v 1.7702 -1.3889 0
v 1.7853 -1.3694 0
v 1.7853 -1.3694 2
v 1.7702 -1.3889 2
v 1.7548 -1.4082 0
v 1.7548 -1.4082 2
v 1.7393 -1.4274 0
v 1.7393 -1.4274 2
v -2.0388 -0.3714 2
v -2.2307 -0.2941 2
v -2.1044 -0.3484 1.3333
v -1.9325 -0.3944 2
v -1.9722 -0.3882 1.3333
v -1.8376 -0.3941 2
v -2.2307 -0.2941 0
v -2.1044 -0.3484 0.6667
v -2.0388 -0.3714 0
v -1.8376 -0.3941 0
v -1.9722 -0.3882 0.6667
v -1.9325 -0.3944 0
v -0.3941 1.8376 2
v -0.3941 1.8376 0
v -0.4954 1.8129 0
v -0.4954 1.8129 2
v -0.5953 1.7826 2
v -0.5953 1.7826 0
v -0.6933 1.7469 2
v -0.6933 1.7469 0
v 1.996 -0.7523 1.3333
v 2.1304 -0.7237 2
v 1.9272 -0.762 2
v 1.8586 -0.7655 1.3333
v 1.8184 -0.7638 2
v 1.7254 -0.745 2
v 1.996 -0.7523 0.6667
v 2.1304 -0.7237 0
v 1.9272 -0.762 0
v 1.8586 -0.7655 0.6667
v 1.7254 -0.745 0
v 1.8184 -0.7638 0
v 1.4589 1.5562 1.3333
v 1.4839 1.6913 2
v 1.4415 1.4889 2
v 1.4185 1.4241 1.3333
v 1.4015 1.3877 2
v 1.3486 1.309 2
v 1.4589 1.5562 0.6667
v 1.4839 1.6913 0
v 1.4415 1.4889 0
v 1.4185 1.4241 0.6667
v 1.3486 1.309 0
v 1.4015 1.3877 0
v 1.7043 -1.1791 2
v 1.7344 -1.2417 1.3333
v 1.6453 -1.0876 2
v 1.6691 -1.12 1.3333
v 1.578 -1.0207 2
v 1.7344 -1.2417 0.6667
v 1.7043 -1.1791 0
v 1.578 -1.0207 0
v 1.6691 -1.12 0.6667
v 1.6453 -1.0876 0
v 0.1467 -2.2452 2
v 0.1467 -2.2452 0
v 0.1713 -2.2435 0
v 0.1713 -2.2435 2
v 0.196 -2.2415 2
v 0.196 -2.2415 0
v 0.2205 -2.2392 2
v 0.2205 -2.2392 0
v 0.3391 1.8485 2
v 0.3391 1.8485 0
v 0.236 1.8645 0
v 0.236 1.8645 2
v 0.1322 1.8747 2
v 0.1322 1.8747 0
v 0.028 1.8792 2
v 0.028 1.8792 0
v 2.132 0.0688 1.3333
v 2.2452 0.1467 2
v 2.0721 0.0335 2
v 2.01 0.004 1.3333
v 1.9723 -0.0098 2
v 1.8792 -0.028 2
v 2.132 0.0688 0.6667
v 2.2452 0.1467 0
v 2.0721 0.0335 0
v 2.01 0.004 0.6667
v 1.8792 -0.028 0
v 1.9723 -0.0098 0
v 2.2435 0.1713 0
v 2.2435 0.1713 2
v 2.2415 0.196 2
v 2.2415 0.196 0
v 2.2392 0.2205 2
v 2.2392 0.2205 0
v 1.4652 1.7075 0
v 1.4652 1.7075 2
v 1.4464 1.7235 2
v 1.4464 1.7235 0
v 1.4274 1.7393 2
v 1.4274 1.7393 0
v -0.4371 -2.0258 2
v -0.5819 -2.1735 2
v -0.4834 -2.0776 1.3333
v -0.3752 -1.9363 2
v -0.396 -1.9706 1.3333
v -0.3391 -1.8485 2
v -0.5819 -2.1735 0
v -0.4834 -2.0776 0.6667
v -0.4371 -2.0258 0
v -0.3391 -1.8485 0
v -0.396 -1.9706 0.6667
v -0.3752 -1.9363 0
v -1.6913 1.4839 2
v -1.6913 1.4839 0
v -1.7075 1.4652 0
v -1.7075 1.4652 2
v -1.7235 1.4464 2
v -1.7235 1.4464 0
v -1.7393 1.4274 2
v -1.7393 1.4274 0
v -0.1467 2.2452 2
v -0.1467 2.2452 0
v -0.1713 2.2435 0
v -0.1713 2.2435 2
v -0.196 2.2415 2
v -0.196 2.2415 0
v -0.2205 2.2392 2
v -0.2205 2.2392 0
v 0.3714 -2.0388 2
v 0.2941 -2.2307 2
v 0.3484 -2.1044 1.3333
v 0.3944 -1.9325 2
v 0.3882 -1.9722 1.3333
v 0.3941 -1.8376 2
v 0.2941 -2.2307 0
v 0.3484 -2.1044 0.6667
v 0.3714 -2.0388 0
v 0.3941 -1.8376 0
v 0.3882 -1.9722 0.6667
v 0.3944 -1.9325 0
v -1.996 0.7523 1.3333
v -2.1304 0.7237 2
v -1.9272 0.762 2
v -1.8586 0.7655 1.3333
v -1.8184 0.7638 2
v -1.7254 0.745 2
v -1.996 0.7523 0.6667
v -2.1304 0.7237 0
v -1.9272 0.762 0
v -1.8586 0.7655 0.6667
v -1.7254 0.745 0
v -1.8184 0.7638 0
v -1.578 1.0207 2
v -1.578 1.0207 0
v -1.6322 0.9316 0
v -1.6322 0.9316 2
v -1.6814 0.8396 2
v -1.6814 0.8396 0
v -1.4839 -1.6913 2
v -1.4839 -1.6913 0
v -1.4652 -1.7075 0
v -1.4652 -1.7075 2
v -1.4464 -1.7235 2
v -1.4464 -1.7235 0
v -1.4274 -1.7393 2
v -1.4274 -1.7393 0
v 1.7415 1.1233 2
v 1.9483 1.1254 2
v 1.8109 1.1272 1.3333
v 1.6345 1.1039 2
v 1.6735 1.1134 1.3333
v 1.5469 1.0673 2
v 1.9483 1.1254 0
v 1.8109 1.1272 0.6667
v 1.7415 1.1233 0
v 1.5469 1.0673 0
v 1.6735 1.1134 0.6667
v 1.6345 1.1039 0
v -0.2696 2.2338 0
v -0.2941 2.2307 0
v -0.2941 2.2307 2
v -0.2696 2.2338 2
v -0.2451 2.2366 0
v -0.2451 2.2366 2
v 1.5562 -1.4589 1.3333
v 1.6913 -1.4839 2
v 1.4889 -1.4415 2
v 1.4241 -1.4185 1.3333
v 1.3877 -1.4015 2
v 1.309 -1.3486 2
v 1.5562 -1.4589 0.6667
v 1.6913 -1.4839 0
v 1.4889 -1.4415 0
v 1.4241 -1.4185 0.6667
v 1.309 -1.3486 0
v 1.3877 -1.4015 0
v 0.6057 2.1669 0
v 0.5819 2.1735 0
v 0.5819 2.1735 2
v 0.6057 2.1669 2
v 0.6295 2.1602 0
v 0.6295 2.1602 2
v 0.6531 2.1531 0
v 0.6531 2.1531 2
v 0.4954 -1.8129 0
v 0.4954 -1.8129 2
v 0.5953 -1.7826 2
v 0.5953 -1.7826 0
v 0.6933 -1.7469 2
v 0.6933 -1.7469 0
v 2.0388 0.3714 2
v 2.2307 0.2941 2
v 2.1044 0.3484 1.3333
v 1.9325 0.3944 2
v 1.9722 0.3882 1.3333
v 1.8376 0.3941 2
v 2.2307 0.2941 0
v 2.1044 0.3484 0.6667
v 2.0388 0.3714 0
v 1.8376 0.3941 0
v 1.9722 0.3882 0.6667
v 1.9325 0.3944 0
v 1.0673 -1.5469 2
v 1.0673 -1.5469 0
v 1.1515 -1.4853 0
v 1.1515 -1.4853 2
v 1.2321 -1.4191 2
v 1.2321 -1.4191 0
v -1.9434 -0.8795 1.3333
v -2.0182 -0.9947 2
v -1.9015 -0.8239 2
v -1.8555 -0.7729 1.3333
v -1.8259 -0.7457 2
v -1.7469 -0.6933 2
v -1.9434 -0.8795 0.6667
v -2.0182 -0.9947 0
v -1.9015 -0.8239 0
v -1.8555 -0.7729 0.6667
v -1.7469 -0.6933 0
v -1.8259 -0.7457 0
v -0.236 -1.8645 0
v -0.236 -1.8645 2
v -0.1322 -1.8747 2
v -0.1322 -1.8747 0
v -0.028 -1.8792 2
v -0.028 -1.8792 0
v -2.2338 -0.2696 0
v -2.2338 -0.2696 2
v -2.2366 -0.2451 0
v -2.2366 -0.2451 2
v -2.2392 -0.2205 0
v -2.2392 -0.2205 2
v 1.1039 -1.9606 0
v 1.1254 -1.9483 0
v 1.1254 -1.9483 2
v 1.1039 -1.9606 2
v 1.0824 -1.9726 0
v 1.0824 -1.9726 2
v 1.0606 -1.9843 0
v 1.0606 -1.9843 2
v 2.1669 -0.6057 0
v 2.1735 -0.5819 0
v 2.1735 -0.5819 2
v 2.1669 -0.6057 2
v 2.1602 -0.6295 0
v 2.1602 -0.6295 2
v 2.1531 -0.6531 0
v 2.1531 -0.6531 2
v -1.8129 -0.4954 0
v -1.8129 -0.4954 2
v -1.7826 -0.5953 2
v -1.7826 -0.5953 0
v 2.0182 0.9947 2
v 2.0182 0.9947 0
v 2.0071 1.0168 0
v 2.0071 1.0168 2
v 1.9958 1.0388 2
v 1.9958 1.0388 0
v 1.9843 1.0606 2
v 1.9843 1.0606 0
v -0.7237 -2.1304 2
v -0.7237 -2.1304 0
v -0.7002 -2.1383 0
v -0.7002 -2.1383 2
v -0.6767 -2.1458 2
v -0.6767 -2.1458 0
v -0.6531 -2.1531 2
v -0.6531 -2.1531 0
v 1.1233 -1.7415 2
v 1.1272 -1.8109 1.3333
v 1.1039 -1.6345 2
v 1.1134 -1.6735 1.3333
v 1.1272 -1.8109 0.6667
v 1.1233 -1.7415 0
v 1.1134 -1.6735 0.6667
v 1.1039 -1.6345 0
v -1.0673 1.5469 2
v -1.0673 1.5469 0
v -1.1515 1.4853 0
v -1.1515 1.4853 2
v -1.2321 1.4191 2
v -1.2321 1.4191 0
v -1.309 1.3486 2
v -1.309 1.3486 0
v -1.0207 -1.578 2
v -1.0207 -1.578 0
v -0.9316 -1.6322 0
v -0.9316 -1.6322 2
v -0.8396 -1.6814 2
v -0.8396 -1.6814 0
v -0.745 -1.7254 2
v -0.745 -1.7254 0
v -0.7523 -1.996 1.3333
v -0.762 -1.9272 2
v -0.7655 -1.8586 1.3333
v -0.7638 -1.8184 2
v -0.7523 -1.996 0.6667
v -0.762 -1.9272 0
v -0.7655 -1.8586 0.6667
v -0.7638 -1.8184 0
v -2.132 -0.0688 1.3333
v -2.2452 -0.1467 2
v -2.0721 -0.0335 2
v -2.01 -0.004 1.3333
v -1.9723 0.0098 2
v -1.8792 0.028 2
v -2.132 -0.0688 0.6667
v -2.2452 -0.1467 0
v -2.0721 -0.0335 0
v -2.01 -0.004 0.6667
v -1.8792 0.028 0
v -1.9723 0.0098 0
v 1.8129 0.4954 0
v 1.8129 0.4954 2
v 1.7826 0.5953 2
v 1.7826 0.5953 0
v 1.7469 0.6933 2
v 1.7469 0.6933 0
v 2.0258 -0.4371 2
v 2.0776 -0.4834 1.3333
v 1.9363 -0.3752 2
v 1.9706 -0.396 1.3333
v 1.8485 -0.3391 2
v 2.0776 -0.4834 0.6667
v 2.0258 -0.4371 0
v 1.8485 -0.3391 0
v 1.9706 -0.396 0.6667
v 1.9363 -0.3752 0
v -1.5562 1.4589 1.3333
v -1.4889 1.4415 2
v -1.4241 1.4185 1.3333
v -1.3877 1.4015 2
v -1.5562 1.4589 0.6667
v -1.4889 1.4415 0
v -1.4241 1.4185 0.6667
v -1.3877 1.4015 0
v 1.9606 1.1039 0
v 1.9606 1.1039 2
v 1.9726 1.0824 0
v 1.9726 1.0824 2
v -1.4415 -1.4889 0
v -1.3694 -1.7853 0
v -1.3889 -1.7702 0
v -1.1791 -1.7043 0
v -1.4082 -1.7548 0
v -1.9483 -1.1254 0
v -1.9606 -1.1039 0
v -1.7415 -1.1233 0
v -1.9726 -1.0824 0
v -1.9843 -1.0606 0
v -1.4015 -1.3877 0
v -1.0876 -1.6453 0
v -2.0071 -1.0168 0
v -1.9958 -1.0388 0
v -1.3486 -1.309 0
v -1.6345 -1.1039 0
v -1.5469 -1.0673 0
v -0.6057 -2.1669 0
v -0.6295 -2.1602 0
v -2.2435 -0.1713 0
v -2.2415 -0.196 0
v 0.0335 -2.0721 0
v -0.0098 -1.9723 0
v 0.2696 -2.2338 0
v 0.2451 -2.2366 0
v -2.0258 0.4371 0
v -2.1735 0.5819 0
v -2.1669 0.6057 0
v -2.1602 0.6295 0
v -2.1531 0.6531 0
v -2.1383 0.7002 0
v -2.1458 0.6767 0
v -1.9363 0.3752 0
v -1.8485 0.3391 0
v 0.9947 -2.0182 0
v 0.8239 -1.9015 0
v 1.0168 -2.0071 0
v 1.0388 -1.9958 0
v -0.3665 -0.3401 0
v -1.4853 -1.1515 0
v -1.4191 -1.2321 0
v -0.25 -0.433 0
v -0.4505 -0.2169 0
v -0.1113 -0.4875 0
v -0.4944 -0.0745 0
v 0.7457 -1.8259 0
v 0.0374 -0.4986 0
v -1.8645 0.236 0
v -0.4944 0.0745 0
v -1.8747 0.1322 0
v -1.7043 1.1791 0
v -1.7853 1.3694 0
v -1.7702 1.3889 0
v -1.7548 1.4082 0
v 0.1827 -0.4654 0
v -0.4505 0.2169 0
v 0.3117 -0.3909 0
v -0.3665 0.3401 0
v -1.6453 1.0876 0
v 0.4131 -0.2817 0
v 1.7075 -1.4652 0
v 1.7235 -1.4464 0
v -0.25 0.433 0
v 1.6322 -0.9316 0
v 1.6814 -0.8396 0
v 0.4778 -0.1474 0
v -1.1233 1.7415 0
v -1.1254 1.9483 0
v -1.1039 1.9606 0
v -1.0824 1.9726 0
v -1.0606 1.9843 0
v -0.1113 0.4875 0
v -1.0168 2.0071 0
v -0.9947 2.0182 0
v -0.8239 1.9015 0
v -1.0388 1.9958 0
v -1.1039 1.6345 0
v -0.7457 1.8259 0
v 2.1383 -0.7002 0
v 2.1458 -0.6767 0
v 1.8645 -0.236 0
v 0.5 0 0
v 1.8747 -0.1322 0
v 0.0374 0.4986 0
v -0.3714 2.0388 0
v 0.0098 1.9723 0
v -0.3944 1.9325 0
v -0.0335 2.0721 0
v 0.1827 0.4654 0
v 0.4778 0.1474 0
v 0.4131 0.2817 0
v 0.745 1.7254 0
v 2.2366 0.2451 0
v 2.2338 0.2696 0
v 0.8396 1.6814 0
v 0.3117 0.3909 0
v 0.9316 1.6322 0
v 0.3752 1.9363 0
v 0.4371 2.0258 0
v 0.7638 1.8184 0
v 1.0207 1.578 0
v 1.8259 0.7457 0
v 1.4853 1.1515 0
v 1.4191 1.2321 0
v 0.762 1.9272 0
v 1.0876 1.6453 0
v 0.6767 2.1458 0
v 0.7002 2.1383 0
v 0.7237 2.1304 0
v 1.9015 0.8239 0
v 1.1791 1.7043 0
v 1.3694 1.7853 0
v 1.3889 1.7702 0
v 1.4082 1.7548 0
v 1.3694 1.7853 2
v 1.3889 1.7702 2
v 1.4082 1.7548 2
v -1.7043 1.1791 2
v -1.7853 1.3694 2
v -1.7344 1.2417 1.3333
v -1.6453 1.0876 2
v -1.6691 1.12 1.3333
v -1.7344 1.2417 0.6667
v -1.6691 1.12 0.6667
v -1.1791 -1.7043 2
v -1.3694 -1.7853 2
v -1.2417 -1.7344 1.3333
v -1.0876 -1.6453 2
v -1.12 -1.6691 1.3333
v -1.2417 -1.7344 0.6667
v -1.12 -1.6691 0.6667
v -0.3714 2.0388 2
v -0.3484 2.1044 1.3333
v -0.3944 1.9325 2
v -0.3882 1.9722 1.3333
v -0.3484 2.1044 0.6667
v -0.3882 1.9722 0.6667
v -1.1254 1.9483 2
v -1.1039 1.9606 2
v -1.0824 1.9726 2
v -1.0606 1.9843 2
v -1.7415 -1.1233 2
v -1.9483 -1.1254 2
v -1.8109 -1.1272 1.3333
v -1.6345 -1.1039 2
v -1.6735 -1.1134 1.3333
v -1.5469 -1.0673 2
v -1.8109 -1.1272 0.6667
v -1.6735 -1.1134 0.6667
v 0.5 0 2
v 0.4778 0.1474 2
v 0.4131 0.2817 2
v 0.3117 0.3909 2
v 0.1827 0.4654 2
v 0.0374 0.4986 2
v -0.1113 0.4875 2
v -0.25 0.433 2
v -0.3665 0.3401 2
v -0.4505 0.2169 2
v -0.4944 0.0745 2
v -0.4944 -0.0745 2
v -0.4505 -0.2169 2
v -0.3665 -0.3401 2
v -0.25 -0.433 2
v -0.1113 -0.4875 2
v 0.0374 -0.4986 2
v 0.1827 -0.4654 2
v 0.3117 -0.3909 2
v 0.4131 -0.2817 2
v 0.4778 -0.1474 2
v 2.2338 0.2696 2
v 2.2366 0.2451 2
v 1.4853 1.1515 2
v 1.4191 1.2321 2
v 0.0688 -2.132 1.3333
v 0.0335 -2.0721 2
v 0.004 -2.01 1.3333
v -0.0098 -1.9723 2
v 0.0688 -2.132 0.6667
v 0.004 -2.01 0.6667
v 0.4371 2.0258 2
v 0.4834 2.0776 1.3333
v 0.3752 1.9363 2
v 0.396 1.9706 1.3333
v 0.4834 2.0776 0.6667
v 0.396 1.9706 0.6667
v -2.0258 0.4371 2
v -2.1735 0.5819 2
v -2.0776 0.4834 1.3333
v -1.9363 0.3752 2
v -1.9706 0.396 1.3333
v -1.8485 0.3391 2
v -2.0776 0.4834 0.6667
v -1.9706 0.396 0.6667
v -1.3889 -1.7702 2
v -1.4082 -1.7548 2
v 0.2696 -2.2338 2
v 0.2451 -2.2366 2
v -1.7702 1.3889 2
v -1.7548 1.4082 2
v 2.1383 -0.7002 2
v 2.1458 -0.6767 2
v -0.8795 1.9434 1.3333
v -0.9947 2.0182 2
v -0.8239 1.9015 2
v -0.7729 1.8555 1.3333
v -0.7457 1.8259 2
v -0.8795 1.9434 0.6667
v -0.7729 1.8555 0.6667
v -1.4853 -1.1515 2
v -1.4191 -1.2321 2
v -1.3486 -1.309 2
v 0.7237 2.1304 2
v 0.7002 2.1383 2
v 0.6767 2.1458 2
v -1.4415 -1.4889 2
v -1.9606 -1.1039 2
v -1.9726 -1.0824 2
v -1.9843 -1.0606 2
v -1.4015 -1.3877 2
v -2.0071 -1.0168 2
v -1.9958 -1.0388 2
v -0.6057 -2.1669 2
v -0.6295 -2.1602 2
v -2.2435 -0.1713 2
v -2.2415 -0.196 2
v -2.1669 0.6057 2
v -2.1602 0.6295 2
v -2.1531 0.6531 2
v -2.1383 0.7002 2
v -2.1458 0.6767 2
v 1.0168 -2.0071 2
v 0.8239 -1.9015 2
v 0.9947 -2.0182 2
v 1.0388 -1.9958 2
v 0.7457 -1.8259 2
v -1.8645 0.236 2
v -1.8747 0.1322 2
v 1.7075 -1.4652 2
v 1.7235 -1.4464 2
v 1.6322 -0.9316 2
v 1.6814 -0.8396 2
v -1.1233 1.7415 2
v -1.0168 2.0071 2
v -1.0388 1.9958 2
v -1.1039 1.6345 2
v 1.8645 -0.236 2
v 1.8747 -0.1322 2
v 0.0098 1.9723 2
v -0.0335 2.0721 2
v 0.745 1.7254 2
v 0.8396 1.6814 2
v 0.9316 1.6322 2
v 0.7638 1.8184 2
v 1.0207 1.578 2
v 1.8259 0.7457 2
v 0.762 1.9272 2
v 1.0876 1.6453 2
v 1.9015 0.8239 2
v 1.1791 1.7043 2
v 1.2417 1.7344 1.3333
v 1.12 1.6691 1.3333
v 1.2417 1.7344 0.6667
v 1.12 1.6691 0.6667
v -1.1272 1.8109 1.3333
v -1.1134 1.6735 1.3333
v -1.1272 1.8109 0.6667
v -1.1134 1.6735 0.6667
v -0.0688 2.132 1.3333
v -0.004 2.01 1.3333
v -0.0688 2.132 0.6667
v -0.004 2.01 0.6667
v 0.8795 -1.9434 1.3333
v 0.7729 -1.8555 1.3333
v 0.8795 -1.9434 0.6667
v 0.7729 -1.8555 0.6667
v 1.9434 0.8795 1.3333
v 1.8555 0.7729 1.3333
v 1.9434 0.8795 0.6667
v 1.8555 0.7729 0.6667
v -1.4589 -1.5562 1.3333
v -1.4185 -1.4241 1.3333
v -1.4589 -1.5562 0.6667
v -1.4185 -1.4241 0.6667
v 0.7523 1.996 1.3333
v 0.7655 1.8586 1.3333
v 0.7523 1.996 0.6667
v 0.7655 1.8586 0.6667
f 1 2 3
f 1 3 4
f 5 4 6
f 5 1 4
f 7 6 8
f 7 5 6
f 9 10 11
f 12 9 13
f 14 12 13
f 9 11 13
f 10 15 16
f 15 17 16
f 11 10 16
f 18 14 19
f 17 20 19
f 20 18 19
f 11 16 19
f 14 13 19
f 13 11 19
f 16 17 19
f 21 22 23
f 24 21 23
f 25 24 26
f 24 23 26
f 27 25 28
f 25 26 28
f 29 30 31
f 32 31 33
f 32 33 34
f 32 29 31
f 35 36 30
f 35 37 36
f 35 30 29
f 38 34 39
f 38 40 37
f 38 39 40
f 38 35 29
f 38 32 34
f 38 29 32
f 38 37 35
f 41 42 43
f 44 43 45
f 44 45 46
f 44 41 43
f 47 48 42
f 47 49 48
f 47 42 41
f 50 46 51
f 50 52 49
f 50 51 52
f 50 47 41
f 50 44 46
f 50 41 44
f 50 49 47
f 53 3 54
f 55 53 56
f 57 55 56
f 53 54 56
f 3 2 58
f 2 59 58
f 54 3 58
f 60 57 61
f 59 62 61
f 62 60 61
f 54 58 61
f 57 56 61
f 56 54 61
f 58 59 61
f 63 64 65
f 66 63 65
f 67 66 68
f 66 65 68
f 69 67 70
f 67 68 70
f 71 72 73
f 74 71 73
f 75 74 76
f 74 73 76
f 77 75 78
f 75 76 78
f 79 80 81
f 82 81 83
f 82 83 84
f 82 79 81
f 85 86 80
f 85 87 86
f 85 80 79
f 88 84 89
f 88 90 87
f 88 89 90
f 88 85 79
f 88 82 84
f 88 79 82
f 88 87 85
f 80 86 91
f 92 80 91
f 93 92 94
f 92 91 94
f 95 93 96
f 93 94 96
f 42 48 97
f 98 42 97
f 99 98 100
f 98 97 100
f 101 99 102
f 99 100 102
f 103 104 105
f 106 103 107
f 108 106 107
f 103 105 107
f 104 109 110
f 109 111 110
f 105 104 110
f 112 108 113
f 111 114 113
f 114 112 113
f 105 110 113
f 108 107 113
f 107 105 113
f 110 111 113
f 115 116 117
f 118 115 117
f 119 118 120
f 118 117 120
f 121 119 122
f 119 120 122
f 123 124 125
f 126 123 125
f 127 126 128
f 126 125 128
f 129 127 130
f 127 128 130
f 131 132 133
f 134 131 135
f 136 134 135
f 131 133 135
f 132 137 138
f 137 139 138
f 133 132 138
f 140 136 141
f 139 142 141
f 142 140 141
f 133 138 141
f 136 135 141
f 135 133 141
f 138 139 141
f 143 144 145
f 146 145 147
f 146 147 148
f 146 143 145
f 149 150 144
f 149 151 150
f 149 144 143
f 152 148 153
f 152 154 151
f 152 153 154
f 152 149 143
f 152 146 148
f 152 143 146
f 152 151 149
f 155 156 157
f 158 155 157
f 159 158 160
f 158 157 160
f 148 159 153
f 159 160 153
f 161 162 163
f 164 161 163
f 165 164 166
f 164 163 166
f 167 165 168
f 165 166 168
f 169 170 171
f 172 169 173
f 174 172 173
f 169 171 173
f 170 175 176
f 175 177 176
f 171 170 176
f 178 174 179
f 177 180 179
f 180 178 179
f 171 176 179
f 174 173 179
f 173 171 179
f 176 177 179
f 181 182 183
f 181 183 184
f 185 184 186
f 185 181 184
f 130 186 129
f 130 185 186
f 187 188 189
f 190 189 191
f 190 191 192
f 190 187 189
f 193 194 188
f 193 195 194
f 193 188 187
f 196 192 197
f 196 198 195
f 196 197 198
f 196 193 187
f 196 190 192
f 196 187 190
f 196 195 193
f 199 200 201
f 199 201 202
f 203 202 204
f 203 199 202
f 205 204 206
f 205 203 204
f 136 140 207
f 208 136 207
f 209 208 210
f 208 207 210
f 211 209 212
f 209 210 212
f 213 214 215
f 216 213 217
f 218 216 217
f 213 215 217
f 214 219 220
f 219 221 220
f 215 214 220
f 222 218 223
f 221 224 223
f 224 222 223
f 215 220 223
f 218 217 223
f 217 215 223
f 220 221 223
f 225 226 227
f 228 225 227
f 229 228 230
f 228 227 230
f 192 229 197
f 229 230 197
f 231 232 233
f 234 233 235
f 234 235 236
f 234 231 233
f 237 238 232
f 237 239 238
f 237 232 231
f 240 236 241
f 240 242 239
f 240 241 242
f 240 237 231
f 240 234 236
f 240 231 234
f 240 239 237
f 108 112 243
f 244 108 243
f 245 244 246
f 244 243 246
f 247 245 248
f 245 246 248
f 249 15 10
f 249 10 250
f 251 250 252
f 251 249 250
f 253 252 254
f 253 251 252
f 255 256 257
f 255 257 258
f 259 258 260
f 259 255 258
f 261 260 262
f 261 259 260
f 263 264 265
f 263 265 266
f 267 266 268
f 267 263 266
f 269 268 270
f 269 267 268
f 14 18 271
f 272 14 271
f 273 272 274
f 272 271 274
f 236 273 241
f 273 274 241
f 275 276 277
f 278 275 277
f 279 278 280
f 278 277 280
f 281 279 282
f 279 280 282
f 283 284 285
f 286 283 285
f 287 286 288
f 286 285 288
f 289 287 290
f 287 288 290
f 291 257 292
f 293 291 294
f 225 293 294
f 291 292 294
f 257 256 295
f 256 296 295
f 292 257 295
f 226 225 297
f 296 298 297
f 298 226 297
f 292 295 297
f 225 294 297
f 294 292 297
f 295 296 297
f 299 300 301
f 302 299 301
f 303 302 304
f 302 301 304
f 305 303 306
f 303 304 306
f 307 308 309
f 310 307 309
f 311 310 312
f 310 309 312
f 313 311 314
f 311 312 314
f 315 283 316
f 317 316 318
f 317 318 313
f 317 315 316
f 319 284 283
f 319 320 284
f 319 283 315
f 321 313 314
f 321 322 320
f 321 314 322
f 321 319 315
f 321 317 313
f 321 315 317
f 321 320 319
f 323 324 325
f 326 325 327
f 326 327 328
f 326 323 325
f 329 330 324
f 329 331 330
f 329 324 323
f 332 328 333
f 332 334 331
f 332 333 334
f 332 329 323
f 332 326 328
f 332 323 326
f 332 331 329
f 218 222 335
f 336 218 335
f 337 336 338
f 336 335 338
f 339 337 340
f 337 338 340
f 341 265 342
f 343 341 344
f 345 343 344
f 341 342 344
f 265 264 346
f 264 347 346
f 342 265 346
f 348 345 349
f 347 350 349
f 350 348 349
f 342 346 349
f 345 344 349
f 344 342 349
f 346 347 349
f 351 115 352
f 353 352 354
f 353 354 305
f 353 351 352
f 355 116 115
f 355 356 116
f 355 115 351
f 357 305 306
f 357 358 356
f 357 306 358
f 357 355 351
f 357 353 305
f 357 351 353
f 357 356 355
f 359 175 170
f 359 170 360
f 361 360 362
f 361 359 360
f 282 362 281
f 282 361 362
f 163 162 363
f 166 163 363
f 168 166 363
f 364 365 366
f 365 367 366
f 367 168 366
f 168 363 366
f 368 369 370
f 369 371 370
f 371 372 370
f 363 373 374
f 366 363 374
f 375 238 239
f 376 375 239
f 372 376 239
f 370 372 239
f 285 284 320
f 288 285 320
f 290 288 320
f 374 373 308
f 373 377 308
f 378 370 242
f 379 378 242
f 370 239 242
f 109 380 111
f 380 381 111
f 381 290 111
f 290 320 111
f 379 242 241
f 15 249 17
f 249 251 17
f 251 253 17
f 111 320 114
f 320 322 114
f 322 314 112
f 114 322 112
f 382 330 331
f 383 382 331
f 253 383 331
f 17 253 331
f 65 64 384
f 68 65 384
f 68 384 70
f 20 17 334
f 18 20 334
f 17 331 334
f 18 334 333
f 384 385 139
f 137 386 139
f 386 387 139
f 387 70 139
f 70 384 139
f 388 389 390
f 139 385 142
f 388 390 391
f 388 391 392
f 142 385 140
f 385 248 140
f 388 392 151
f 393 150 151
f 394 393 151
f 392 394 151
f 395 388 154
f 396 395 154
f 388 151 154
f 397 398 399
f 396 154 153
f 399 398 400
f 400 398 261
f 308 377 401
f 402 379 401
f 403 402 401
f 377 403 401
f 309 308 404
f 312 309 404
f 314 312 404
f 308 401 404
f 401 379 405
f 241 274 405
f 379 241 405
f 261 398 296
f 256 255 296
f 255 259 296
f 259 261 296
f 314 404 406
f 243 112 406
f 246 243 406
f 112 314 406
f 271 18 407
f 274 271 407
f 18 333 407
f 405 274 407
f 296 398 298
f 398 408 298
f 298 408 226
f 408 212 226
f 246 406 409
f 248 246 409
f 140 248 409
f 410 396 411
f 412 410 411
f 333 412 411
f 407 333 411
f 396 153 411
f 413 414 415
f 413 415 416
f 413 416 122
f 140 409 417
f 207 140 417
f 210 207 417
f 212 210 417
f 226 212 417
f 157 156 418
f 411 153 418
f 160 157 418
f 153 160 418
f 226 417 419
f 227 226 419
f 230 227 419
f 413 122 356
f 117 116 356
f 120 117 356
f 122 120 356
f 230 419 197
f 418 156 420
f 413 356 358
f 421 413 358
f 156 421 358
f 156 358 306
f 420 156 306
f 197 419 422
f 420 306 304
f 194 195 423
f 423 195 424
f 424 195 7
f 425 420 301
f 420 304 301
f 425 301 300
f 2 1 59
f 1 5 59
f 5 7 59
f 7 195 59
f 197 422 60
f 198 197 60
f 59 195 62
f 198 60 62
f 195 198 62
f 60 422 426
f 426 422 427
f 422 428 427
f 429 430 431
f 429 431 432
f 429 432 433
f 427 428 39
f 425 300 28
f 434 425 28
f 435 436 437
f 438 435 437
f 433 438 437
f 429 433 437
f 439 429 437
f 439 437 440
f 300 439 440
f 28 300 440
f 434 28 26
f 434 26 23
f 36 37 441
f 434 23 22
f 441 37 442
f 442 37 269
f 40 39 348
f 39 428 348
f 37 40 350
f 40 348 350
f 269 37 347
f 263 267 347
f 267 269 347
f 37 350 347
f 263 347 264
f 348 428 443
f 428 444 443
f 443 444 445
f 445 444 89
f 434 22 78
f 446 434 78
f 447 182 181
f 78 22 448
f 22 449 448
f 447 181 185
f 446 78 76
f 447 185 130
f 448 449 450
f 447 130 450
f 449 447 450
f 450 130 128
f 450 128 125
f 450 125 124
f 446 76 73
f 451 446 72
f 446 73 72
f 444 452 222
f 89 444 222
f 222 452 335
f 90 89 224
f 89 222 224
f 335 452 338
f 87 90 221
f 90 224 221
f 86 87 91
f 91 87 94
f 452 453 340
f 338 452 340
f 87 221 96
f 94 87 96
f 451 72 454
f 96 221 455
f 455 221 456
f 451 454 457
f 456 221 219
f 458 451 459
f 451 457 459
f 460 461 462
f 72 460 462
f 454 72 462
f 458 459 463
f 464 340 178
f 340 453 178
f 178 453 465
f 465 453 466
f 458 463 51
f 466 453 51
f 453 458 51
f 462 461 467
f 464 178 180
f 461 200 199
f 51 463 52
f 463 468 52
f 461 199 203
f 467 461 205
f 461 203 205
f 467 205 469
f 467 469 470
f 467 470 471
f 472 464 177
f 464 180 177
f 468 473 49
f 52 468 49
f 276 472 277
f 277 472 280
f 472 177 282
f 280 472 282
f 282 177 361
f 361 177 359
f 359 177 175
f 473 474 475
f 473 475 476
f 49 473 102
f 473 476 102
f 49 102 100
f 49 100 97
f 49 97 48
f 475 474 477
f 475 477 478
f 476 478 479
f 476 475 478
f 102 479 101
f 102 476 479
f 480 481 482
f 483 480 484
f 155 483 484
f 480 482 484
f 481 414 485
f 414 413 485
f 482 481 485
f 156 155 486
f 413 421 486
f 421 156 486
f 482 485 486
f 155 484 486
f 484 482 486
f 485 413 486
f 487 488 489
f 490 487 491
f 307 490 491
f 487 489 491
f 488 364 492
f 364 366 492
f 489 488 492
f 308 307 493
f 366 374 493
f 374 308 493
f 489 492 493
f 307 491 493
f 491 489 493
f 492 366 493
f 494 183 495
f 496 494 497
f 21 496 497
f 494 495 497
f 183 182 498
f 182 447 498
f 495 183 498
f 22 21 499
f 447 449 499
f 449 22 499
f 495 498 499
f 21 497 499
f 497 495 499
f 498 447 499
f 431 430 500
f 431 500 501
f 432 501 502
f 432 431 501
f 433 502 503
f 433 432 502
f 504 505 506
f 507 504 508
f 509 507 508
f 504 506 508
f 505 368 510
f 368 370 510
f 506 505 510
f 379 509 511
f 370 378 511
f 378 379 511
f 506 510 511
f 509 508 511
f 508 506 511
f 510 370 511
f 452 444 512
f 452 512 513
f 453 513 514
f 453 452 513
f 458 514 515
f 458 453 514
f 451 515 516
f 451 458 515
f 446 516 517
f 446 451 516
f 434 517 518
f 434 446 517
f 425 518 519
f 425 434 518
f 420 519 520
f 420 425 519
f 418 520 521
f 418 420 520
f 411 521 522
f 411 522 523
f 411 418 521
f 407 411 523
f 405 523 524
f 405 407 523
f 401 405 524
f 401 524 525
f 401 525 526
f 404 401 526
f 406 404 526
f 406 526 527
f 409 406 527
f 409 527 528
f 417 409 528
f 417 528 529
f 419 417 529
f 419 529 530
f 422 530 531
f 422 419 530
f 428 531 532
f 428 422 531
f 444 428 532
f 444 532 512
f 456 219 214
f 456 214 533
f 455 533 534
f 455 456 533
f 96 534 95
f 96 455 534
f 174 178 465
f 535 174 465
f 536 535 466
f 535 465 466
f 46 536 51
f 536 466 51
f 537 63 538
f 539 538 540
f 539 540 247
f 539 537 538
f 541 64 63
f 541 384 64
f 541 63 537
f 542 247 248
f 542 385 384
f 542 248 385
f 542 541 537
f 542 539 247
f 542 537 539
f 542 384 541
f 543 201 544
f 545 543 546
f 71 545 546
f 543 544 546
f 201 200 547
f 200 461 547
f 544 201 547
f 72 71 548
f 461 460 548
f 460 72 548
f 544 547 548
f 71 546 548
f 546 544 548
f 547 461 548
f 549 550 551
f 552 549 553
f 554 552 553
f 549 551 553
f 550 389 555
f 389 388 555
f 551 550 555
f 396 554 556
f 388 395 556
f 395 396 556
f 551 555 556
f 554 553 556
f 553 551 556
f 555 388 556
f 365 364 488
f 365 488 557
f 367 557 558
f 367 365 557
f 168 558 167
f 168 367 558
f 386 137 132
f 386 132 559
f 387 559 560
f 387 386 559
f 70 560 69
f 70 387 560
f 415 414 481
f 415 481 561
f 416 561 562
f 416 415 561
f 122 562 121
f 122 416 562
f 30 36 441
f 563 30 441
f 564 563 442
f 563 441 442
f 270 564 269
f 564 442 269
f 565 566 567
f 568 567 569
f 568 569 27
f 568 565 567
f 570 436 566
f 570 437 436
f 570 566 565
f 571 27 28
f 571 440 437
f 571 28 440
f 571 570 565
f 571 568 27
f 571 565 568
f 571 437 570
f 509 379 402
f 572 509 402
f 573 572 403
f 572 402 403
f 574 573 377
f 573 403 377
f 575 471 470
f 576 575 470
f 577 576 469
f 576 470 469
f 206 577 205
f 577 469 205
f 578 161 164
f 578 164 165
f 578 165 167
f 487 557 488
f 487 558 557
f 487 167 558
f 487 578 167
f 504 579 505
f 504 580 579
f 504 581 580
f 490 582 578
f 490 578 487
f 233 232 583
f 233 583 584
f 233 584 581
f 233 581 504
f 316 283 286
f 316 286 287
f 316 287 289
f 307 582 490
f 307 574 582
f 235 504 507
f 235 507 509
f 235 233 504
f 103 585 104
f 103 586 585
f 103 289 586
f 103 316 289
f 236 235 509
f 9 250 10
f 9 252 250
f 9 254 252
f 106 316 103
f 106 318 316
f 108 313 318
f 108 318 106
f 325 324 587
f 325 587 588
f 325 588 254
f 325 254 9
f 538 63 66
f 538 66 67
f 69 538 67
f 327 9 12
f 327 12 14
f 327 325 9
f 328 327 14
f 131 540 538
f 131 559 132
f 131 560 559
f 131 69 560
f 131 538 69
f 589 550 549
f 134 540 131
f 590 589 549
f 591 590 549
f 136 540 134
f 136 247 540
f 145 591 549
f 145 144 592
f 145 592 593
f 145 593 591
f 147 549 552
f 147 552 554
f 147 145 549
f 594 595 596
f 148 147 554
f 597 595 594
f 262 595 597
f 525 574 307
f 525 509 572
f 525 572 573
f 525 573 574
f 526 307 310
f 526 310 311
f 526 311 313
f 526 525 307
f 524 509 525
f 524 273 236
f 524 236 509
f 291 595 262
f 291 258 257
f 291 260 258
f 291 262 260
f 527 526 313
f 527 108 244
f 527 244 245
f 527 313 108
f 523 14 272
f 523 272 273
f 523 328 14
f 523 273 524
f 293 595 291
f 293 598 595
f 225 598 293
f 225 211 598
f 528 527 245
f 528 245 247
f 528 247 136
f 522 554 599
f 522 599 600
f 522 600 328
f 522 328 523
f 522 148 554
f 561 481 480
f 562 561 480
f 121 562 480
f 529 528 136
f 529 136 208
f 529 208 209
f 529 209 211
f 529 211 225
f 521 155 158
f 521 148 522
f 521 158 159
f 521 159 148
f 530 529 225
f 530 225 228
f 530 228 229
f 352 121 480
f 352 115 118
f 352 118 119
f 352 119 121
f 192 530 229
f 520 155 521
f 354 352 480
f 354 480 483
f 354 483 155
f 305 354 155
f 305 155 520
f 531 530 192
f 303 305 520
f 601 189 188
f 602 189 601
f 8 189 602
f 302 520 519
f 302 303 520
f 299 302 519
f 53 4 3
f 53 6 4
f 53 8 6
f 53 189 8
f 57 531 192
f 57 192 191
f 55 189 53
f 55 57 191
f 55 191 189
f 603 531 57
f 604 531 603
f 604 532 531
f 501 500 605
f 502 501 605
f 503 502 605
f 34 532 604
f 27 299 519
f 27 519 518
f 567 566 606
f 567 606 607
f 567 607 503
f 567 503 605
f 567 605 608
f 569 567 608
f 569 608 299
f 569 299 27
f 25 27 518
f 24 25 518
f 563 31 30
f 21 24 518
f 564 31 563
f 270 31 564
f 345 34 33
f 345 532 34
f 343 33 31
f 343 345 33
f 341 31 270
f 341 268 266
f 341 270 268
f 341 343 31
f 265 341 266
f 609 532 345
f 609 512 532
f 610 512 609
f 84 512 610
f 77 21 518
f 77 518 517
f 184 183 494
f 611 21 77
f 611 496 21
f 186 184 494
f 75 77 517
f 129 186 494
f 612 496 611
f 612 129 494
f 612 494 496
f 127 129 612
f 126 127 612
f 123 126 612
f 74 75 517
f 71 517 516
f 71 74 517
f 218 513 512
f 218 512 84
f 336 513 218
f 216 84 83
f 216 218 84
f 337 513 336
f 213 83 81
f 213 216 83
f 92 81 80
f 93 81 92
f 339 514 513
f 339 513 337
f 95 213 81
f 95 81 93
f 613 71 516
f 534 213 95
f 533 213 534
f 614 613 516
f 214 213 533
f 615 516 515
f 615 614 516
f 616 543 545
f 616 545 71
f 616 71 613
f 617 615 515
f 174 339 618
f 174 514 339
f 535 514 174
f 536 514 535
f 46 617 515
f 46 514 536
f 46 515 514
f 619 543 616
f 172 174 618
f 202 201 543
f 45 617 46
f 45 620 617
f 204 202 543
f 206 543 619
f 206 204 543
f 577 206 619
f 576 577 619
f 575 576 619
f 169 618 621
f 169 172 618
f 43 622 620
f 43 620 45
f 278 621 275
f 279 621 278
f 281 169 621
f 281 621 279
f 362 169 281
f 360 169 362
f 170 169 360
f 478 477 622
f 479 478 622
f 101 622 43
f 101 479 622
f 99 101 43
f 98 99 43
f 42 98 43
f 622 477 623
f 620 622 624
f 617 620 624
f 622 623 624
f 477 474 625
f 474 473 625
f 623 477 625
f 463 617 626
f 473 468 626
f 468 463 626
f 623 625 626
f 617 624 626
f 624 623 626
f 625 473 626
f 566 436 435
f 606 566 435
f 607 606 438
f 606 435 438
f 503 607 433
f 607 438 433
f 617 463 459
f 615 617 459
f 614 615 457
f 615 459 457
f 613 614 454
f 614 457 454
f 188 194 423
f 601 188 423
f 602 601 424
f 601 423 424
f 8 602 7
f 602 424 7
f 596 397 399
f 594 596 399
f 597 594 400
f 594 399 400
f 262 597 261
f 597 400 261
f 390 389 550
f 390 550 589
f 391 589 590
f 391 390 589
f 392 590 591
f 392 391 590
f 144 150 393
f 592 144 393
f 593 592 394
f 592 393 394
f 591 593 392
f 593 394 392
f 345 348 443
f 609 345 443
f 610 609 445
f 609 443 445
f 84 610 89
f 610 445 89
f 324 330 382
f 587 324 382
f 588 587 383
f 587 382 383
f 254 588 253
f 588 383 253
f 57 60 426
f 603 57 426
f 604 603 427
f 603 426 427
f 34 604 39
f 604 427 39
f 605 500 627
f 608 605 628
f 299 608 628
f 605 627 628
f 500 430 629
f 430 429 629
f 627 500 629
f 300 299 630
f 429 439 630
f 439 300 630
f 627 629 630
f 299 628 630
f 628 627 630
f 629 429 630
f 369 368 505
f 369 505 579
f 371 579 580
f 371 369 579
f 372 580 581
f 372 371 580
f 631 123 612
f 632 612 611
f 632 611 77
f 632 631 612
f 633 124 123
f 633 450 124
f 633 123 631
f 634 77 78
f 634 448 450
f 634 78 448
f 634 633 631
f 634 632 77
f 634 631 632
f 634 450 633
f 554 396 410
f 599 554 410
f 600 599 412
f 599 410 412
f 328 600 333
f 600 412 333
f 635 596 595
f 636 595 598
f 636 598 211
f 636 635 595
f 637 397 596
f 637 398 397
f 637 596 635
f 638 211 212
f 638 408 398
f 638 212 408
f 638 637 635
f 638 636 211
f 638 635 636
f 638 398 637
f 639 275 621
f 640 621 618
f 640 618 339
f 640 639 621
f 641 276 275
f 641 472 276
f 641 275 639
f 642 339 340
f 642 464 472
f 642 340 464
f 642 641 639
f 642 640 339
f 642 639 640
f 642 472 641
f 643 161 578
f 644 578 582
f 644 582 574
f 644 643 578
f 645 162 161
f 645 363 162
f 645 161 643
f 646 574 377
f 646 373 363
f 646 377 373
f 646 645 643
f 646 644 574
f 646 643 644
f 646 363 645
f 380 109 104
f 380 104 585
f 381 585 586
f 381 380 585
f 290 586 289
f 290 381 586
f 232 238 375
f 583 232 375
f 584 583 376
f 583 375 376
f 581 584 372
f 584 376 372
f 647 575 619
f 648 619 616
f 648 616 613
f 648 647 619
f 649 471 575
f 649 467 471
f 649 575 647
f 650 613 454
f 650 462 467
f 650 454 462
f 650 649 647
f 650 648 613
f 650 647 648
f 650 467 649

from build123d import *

# Parameters (mm, degrees)
BOSS_EXTRUDE7_DEPTH = 2
CIRPATTERN1_COUNT   = 16
DIAMETRO_BASE_R     = 1.879385242
BOSS_EXTRUDE9_DEPTH = 2
MOZZO_R             = 0.5
CUT_EXTRUDE1_DEPTH  = 2


with BuildPart() as part:
    # profilo → Boss-Extrude7 (new body)
    with BuildSketch(Plane.XY):
        with BuildLine():
            Line((-0.220538566, 2.239165635), (-0.184211967, 1.870335488))
            ThreePointArc((-0.184211967, 1.870335488), (-0.078225963, 1.87775653), (0.028010042, 1.879176501))
            add(Edge.make_bspline(
                [(-0.14670524, 2.245212144), (-0.068888242, 2.136288179), (0.01902302, 2.014536344), (0.028010042, 1.879176501)],
                knots=[0.201514188, 0.201514188, 0.201514188, 0.201514188, 1, 1, 1, 1], degree=3))
            ThreePointArc((-0.14670524, 2.245212144), (-0.18364679, 2.242492777), (-0.220538566, 2.239165635))
        make_face()
    extrude(amount=BOSS_EXTRUDE7_DEPTH)

    # Mirror1: part across plane


with BuildPart() as part_1:
    add(part.part)
    add(part.part.mirror(Plane(origin=(0, 0, 0), x_dir=(0, 0, 1), z_dir=(0.9951847266721969, 0.09801714032956144, 0))))


with BuildPart() as cirpattern1_1:
    # CirPattern1: pattern copy
    add(part_1.part.rotate(Axis((0, 0, 2), (0, 0, 1)), 1 * 360 / CIRPATTERN1_COUNT))


with BuildPart() as cirpattern1_2:
    # CirPattern1: pattern copy
    add(part_1.part.rotate(Axis((0, 0, 2), (0, 0, 1)), 2 * 360 / CIRPATTERN1_COUNT))


with BuildPart() as cirpattern1_3:
    # CirPattern1: pattern copy
    add(part_1.part.rotate(Axis((0, 0, 2), (0, 0, 1)), 3 * 360 / CIRPATTERN1_COUNT))


with BuildPart() as cirpattern1_4:
    # CirPattern1: pattern copy
    add(part_1.part.rotate(Axis((0, 0, 2), (0, 0, 1)), 4 * 360 / CIRPATTERN1_COUNT))


with BuildPart() as cirpattern1_5:
    # CirPattern1: pattern copy
    add(part_1.part.rotate(Axis((0, 0, 2), (0, 0, 1)), 5 * 360 / CIRPATTERN1_COUNT))


with BuildPart() as cirpattern1_6:
    # CirPattern1: pattern copy
    add(part_1.part.rotate(Axis((0, 0, 2), (0, 0, 1)), 6 * 360 / CIRPATTERN1_COUNT))


with BuildPart() as cirpattern1_7:
    # CirPattern1: pattern copy
    add(part_1.part.rotate(Axis((0, 0, 2), (0, 0, 1)), 7 * 360 / CIRPATTERN1_COUNT))


with BuildPart() as cirpattern1_8:
    # CirPattern1: pattern copy
    add(part_1.part.rotate(Axis((0, 0, 2), (0, 0, 1)), 8 * 360 / CIRPATTERN1_COUNT))


with BuildPart() as cirpattern1_9:
    # CirPattern1: pattern copy
    add(part_1.part.rotate(Axis((0, 0, 2), (0, 0, 1)), 9 * 360 / CIRPATTERN1_COUNT))


with BuildPart() as cirpattern1_10:
    # CirPattern1: pattern copy
    add(part_1.part.rotate(Axis((0, 0, 2), (0, 0, 1)), 10 * 360 / CIRPATTERN1_COUNT))


with BuildPart() as cirpattern1_11:
    # CirPattern1: pattern copy
    add(part_1.part.rotate(Axis((0, 0, 2), (0, 0, 1)), 11 * 360 / CIRPATTERN1_COUNT))


with BuildPart() as cirpattern1_12:
    # CirPattern1: pattern copy
    add(part_1.part.rotate(Axis((0, 0, 2), (0, 0, 1)), 12 * 360 / CIRPATTERN1_COUNT))


with BuildPart() as cirpattern1_13:
    # CirPattern1: pattern copy
    add(part_1.part.rotate(Axis((0, 0, 2), (0, 0, 1)), 13 * 360 / CIRPATTERN1_COUNT))


with BuildPart() as cirpattern1_14:
    # CirPattern1: pattern copy
    add(part_1.part.rotate(Axis((0, 0, 2), (0, 0, 1)), 14 * 360 / CIRPATTERN1_COUNT))


with BuildPart() as cirpattern1_15:
    # CirPattern1: pattern copy
    add(part_1.part.rotate(Axis((0, 0, 2), (0, 0, 1)), 15 * 360 / CIRPATTERN1_COUNT))


with BuildPart() as part_2:
    add(part_1.part)

    add(cirpattern1_1.part)  # Boss-Extrude9 merges CirPattern1_1

    add(cirpattern1_2.part)  # Boss-Extrude9 merges CirPattern1_2

    add(cirpattern1_3.part)  # Boss-Extrude9 merges CirPattern1_3

    add(cirpattern1_4.part)  # Boss-Extrude9 merges CirPattern1_4

    add(cirpattern1_5.part)  # Boss-Extrude9 merges CirPattern1_5

    add(cirpattern1_6.part)  # Boss-Extrude9 merges CirPattern1_6

    add(cirpattern1_7.part)  # Boss-Extrude9 merges CirPattern1_7

    add(cirpattern1_8.part)  # Boss-Extrude9 merges CirPattern1_8

    add(cirpattern1_9.part)  # Boss-Extrude9 merges CirPattern1_9

    add(cirpattern1_10.part)  # Boss-Extrude9 merges CirPattern1_10

    add(cirpattern1_11.part)  # Boss-Extrude9 merges CirPattern1_11

    add(cirpattern1_12.part)  # Boss-Extrude9 merges CirPattern1_12

    add(cirpattern1_13.part)  # Boss-Extrude9 merges CirPattern1_13

    add(cirpattern1_14.part)  # Boss-Extrude9 merges CirPattern1_14

    add(cirpattern1_15.part)  # Boss-Extrude9 merges CirPattern1_15
    # diametro base → Boss-Extrude9 (add)
    with BuildSketch(Plane.XY):
        Circle(DIAMETRO_BASE_R)
    extrude(amount=BOSS_EXTRUDE9_DEPTH)

    # mozzo → Cut-Extrude1 (cut)
    with BuildSketch(Plane.XY):
        Circle(MOZZO_R)
    extrude(amount=CUT_EXTRUDE1_DEPTH, mode=Mode.SUBTRACT)


solid = part_2.part
